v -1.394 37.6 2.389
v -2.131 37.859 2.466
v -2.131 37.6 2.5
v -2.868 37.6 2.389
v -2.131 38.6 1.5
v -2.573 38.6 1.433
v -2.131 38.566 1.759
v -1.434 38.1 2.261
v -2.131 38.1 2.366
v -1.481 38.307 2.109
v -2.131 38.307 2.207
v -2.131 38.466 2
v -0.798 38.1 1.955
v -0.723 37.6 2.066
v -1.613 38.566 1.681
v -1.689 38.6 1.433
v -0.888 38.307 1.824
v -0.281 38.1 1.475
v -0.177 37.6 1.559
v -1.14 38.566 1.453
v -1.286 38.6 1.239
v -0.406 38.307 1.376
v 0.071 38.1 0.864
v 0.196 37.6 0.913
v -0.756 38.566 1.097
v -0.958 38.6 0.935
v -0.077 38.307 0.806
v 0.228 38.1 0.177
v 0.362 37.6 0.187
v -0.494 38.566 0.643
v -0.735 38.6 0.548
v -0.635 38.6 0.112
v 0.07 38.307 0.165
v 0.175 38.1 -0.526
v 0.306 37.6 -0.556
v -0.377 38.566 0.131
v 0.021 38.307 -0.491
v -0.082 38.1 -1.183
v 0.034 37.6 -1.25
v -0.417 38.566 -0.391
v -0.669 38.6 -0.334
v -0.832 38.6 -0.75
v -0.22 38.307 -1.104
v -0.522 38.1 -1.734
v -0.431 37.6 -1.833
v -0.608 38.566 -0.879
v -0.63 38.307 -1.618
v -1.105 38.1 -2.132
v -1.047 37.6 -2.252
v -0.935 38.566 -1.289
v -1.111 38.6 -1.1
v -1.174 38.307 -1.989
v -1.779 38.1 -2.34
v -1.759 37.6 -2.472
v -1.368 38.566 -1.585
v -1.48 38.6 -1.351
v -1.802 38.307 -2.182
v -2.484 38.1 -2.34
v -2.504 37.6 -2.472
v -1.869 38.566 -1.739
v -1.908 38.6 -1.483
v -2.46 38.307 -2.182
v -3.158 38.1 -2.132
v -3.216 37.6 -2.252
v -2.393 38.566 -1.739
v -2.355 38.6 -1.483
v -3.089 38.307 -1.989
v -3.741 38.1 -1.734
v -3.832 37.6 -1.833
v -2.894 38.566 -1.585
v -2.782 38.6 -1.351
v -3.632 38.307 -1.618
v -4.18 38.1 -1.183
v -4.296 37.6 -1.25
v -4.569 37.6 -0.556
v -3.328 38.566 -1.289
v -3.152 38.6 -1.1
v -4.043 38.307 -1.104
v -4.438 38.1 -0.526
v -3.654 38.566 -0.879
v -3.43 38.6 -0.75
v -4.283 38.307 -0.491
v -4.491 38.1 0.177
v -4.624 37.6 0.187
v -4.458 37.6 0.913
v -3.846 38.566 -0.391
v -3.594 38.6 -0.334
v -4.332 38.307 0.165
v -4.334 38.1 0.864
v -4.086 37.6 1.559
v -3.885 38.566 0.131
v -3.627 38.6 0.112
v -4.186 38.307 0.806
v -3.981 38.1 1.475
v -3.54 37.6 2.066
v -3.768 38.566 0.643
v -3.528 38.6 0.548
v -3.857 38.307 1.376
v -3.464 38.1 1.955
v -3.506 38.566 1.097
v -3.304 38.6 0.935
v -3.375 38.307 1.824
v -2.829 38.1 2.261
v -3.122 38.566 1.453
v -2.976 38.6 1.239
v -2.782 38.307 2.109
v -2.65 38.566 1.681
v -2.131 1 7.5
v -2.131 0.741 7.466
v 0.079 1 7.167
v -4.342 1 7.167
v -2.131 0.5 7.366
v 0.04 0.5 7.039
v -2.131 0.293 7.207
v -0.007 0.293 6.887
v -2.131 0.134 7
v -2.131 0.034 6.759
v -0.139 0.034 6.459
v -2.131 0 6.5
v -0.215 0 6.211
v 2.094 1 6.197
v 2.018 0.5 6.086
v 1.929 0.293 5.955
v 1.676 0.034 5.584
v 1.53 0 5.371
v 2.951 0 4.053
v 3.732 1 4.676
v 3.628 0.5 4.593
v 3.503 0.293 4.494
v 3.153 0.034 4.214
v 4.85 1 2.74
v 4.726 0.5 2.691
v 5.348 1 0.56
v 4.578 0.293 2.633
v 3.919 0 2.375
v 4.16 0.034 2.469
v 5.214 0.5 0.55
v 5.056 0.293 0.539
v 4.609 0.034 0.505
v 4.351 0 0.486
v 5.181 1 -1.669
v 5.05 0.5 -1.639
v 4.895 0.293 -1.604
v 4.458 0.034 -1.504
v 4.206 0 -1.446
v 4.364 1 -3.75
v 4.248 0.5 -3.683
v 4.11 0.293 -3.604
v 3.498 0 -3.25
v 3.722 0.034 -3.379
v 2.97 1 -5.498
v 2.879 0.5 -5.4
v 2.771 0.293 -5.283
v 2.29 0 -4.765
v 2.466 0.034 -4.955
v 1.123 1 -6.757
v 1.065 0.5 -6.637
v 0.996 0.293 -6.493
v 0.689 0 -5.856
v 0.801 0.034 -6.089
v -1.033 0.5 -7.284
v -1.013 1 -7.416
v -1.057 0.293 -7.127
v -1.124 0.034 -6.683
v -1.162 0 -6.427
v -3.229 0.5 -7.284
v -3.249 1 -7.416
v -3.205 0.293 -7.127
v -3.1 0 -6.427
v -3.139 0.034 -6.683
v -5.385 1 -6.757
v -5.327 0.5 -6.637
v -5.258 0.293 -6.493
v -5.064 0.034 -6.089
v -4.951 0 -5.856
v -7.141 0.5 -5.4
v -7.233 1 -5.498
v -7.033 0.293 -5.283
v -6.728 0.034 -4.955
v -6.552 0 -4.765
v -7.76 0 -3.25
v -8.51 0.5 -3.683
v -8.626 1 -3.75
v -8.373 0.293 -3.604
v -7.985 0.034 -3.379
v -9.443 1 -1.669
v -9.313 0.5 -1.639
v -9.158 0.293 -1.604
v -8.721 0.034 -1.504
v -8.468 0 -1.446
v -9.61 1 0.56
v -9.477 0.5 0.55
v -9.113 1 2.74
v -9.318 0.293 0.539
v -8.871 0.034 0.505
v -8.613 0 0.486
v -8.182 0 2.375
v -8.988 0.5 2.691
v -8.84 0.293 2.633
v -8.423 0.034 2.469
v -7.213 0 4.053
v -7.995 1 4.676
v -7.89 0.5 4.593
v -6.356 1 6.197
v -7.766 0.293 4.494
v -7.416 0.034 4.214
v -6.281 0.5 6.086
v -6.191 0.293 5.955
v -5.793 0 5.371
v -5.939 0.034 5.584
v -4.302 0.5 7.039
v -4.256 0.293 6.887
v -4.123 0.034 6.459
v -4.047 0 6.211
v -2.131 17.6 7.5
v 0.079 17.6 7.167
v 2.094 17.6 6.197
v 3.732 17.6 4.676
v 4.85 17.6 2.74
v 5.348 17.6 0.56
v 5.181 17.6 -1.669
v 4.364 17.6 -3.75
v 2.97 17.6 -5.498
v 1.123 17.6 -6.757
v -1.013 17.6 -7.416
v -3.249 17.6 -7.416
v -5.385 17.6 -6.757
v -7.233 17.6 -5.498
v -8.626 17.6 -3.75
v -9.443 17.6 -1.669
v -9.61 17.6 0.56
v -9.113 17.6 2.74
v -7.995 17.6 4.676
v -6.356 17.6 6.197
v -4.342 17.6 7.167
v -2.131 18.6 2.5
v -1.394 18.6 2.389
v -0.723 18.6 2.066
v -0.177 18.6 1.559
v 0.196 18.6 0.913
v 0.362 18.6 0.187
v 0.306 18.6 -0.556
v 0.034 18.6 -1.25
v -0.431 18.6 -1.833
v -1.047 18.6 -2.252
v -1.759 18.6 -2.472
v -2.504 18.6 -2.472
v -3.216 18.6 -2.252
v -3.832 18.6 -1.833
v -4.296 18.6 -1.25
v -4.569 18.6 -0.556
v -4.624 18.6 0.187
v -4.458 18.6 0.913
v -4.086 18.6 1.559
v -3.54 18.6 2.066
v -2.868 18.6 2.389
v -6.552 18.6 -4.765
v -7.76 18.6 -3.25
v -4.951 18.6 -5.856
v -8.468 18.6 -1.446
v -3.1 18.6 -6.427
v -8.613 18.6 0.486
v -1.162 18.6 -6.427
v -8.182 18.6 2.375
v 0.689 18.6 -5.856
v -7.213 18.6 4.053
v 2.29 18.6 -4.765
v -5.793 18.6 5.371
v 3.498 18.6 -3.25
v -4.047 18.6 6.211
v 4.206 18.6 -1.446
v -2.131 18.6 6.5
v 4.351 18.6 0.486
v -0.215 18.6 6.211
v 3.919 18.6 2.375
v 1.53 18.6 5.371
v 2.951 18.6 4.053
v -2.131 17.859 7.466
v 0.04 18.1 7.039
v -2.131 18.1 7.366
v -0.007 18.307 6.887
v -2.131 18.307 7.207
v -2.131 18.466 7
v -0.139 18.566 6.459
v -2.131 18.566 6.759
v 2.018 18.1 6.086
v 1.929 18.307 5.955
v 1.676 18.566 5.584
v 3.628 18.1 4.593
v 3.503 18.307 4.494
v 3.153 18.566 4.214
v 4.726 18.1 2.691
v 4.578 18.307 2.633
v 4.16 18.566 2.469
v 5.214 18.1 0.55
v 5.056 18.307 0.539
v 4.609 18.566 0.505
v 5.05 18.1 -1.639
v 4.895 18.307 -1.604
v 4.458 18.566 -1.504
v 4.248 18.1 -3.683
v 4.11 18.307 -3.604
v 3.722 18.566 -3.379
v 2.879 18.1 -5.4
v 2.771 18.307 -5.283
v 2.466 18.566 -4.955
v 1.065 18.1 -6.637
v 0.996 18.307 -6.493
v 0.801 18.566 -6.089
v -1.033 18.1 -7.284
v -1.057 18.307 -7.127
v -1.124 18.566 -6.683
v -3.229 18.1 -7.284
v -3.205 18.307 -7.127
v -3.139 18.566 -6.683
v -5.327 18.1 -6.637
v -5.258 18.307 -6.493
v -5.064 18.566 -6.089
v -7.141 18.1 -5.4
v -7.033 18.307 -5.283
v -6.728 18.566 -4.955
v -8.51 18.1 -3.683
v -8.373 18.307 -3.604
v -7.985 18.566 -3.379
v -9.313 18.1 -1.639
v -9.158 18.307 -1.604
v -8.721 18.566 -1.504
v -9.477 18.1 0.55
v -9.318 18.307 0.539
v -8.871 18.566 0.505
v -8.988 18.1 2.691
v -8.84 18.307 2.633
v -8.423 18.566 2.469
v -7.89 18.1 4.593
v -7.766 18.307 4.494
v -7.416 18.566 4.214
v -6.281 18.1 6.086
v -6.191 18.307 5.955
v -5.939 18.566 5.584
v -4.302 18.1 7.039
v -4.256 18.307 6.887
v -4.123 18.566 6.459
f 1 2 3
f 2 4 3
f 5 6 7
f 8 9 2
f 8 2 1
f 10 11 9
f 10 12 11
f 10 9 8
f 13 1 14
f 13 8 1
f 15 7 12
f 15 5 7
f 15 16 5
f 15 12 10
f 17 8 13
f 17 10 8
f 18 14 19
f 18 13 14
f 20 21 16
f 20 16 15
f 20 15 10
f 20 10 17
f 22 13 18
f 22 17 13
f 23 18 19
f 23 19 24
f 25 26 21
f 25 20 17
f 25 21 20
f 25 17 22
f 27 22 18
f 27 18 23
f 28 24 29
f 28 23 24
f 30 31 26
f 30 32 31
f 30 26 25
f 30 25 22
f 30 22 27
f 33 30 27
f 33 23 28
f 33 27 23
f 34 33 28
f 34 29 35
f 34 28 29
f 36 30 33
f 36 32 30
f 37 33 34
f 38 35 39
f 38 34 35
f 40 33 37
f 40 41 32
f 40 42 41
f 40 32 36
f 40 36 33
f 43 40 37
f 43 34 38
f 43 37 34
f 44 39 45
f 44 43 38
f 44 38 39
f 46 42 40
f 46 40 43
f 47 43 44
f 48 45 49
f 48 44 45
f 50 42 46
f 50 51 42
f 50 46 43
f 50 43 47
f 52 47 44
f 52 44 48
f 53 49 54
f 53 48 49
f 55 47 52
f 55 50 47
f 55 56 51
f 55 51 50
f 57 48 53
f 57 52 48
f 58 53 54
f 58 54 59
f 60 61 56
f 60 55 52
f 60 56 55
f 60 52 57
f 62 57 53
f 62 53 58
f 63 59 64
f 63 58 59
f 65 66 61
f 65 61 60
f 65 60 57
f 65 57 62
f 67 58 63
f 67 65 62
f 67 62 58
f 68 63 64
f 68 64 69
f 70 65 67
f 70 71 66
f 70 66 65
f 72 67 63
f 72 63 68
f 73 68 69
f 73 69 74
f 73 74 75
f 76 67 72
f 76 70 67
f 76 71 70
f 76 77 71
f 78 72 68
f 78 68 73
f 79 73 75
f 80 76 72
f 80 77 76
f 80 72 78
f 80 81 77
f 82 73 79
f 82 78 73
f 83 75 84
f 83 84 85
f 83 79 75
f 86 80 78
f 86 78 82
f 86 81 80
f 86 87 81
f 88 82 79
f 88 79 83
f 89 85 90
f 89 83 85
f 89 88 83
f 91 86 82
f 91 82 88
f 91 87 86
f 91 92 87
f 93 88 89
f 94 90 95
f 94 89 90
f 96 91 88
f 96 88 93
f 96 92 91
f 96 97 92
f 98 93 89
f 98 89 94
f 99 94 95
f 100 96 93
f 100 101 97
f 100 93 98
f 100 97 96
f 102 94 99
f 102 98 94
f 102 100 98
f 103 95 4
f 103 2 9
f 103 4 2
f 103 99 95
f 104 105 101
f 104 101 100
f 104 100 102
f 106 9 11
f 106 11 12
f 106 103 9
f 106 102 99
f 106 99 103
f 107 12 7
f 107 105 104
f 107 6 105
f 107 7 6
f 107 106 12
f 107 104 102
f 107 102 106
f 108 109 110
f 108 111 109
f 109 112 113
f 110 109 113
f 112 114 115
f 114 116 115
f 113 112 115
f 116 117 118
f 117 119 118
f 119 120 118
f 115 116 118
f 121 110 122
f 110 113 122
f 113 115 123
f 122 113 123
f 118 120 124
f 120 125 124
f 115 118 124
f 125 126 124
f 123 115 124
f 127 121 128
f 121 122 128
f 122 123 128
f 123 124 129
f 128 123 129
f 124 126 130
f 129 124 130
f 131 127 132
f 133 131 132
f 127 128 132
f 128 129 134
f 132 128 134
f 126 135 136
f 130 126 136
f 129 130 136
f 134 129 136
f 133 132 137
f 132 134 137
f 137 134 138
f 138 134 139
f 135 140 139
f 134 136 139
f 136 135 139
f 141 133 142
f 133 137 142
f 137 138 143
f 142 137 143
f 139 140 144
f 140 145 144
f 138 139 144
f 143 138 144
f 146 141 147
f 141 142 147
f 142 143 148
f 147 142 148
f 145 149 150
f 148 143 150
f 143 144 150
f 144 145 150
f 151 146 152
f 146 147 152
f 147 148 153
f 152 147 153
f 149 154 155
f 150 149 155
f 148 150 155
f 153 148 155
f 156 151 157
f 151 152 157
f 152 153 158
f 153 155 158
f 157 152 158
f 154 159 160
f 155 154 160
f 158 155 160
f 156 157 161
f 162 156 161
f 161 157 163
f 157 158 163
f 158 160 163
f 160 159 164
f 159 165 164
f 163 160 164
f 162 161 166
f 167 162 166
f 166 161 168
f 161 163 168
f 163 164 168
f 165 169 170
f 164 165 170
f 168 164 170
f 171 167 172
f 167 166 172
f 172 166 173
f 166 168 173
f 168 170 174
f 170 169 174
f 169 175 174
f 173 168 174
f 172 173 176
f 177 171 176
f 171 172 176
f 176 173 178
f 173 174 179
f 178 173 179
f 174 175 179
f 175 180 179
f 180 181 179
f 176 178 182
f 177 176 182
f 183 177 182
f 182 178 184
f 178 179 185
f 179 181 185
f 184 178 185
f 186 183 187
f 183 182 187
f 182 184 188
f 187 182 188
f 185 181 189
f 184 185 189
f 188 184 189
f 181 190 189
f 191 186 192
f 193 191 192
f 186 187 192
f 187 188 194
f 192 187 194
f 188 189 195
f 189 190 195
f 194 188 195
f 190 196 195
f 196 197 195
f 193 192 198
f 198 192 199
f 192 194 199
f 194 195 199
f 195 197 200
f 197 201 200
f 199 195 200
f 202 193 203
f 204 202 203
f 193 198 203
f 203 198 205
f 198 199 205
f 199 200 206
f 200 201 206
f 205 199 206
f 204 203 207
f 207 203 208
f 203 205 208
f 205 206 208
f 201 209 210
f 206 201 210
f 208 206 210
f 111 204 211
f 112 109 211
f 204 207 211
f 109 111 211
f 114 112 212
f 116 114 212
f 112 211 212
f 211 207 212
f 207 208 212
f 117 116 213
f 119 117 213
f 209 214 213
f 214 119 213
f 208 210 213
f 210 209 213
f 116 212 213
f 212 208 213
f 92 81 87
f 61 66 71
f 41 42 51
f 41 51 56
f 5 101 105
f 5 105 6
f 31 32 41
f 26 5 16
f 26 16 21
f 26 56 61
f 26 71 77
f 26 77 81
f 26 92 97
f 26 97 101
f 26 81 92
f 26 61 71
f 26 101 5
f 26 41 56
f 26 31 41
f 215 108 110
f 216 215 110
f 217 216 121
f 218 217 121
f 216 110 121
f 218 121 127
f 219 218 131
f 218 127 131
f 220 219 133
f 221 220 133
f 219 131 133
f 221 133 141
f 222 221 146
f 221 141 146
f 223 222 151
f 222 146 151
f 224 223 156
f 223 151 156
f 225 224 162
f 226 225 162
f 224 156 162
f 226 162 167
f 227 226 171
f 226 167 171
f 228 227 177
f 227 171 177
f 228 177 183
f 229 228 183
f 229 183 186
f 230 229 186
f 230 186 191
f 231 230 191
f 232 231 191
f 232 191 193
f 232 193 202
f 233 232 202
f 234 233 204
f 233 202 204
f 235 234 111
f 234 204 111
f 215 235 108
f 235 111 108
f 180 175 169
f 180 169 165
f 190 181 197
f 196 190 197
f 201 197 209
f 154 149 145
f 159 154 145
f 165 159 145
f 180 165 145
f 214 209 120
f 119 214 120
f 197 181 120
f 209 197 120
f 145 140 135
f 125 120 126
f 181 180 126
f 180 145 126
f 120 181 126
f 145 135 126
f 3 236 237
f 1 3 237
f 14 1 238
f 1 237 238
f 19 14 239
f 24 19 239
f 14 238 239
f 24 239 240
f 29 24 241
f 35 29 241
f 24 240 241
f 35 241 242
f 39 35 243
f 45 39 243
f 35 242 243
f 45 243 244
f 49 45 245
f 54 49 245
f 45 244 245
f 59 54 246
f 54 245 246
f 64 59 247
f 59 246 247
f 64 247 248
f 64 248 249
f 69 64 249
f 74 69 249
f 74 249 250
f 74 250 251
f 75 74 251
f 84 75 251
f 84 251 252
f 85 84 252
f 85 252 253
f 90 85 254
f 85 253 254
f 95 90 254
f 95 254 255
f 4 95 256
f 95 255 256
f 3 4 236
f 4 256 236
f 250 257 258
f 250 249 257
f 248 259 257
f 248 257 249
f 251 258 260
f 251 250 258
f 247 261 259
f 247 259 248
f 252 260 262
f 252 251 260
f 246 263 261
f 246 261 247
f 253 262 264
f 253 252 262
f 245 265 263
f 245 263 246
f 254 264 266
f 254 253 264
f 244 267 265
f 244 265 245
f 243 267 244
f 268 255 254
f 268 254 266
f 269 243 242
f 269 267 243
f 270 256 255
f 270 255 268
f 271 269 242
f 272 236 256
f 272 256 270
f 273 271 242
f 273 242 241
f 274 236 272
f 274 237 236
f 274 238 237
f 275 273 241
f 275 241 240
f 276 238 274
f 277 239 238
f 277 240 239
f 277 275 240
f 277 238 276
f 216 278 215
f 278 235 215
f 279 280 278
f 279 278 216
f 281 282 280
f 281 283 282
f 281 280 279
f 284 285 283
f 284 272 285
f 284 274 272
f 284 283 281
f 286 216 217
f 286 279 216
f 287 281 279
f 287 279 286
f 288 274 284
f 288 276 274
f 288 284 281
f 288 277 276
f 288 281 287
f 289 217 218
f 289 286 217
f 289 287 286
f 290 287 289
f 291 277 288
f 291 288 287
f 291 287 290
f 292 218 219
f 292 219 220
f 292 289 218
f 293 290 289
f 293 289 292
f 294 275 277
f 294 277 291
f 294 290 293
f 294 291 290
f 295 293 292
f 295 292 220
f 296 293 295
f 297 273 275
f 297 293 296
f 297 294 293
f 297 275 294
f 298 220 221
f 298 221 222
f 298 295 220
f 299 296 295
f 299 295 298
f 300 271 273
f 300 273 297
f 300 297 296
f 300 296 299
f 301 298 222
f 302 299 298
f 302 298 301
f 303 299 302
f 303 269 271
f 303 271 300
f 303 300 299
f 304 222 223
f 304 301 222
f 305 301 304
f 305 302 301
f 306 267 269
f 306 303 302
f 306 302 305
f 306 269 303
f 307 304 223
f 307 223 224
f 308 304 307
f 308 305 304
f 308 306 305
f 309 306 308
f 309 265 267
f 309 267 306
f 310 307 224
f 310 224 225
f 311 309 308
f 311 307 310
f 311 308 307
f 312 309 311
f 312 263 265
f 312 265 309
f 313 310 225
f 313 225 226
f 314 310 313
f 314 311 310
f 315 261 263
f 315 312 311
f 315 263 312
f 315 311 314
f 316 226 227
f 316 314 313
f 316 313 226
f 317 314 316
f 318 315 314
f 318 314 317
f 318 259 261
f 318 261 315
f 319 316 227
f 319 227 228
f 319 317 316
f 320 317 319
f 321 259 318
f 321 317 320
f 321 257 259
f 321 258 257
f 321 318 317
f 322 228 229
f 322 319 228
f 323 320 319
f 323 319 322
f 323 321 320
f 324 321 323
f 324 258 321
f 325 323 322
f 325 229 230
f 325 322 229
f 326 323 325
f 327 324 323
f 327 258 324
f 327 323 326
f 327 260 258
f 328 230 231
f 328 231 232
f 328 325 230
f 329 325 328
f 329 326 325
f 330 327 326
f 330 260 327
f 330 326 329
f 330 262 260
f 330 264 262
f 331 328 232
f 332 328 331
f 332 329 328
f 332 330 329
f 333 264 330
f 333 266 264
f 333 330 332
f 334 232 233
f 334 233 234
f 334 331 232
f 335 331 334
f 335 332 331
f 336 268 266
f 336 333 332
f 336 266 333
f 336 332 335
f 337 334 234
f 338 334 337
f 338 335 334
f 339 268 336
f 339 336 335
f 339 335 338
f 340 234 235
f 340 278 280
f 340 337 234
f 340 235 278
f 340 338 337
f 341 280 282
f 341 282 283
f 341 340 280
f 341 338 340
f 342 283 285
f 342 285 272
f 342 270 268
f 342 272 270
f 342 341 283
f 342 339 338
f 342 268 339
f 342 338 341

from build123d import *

# Parameters (mm, degrees)
ESBO_O1_R                = 7.5
RESSALTO_EXTRUS_O1_DEPTH = 18.6
ESBO_O2_R                = 2.5
RESSALTO_EXTRUS_O2_DEPTH = 20
FILETE1_R                = 1


with BuildPart() as part:
    # Esboço1 → Ressalto-extrusão1 (new body)
    with BuildSketch(Plane(origin=(0, 0, 0), x_dir=(1, 0, 0), z_dir=(0, 1, 0))):
        with Locations(Location((-2.131243559, 0, 0), (0, 0, 270))):
            Circle(ESBO_O1_R)
    extrude(amount=RESSALTO_EXTRUS_O1_DEPTH)

    # Esboço2 → Ressalto-extrusão2 (add)
    with BuildSketch(Plane(origin=(0, 18.6, 0), x_dir=(1, 0, 0), z_dir=(0, 1, 0))):
        with Locations(Location((-2.131243559, 0, 0), (0, 0, 270))):
            Circle(ESBO_O2_R)
    extrude(amount=RESSALTO_EXTRUS_O2_DEPTH)

    # Filete1
    filete1_edges = [part.edges().sort_by_distance(p)[0] for p in [
        (-2.131243559, 0, -7.5),
        (-2.131243559, 18.6, -7.5),
        (-2.131243559, 38.6, -2.5),
    ]]
    fillet(filete1_edges, radius=FILETE1_R)


solid = part.part
